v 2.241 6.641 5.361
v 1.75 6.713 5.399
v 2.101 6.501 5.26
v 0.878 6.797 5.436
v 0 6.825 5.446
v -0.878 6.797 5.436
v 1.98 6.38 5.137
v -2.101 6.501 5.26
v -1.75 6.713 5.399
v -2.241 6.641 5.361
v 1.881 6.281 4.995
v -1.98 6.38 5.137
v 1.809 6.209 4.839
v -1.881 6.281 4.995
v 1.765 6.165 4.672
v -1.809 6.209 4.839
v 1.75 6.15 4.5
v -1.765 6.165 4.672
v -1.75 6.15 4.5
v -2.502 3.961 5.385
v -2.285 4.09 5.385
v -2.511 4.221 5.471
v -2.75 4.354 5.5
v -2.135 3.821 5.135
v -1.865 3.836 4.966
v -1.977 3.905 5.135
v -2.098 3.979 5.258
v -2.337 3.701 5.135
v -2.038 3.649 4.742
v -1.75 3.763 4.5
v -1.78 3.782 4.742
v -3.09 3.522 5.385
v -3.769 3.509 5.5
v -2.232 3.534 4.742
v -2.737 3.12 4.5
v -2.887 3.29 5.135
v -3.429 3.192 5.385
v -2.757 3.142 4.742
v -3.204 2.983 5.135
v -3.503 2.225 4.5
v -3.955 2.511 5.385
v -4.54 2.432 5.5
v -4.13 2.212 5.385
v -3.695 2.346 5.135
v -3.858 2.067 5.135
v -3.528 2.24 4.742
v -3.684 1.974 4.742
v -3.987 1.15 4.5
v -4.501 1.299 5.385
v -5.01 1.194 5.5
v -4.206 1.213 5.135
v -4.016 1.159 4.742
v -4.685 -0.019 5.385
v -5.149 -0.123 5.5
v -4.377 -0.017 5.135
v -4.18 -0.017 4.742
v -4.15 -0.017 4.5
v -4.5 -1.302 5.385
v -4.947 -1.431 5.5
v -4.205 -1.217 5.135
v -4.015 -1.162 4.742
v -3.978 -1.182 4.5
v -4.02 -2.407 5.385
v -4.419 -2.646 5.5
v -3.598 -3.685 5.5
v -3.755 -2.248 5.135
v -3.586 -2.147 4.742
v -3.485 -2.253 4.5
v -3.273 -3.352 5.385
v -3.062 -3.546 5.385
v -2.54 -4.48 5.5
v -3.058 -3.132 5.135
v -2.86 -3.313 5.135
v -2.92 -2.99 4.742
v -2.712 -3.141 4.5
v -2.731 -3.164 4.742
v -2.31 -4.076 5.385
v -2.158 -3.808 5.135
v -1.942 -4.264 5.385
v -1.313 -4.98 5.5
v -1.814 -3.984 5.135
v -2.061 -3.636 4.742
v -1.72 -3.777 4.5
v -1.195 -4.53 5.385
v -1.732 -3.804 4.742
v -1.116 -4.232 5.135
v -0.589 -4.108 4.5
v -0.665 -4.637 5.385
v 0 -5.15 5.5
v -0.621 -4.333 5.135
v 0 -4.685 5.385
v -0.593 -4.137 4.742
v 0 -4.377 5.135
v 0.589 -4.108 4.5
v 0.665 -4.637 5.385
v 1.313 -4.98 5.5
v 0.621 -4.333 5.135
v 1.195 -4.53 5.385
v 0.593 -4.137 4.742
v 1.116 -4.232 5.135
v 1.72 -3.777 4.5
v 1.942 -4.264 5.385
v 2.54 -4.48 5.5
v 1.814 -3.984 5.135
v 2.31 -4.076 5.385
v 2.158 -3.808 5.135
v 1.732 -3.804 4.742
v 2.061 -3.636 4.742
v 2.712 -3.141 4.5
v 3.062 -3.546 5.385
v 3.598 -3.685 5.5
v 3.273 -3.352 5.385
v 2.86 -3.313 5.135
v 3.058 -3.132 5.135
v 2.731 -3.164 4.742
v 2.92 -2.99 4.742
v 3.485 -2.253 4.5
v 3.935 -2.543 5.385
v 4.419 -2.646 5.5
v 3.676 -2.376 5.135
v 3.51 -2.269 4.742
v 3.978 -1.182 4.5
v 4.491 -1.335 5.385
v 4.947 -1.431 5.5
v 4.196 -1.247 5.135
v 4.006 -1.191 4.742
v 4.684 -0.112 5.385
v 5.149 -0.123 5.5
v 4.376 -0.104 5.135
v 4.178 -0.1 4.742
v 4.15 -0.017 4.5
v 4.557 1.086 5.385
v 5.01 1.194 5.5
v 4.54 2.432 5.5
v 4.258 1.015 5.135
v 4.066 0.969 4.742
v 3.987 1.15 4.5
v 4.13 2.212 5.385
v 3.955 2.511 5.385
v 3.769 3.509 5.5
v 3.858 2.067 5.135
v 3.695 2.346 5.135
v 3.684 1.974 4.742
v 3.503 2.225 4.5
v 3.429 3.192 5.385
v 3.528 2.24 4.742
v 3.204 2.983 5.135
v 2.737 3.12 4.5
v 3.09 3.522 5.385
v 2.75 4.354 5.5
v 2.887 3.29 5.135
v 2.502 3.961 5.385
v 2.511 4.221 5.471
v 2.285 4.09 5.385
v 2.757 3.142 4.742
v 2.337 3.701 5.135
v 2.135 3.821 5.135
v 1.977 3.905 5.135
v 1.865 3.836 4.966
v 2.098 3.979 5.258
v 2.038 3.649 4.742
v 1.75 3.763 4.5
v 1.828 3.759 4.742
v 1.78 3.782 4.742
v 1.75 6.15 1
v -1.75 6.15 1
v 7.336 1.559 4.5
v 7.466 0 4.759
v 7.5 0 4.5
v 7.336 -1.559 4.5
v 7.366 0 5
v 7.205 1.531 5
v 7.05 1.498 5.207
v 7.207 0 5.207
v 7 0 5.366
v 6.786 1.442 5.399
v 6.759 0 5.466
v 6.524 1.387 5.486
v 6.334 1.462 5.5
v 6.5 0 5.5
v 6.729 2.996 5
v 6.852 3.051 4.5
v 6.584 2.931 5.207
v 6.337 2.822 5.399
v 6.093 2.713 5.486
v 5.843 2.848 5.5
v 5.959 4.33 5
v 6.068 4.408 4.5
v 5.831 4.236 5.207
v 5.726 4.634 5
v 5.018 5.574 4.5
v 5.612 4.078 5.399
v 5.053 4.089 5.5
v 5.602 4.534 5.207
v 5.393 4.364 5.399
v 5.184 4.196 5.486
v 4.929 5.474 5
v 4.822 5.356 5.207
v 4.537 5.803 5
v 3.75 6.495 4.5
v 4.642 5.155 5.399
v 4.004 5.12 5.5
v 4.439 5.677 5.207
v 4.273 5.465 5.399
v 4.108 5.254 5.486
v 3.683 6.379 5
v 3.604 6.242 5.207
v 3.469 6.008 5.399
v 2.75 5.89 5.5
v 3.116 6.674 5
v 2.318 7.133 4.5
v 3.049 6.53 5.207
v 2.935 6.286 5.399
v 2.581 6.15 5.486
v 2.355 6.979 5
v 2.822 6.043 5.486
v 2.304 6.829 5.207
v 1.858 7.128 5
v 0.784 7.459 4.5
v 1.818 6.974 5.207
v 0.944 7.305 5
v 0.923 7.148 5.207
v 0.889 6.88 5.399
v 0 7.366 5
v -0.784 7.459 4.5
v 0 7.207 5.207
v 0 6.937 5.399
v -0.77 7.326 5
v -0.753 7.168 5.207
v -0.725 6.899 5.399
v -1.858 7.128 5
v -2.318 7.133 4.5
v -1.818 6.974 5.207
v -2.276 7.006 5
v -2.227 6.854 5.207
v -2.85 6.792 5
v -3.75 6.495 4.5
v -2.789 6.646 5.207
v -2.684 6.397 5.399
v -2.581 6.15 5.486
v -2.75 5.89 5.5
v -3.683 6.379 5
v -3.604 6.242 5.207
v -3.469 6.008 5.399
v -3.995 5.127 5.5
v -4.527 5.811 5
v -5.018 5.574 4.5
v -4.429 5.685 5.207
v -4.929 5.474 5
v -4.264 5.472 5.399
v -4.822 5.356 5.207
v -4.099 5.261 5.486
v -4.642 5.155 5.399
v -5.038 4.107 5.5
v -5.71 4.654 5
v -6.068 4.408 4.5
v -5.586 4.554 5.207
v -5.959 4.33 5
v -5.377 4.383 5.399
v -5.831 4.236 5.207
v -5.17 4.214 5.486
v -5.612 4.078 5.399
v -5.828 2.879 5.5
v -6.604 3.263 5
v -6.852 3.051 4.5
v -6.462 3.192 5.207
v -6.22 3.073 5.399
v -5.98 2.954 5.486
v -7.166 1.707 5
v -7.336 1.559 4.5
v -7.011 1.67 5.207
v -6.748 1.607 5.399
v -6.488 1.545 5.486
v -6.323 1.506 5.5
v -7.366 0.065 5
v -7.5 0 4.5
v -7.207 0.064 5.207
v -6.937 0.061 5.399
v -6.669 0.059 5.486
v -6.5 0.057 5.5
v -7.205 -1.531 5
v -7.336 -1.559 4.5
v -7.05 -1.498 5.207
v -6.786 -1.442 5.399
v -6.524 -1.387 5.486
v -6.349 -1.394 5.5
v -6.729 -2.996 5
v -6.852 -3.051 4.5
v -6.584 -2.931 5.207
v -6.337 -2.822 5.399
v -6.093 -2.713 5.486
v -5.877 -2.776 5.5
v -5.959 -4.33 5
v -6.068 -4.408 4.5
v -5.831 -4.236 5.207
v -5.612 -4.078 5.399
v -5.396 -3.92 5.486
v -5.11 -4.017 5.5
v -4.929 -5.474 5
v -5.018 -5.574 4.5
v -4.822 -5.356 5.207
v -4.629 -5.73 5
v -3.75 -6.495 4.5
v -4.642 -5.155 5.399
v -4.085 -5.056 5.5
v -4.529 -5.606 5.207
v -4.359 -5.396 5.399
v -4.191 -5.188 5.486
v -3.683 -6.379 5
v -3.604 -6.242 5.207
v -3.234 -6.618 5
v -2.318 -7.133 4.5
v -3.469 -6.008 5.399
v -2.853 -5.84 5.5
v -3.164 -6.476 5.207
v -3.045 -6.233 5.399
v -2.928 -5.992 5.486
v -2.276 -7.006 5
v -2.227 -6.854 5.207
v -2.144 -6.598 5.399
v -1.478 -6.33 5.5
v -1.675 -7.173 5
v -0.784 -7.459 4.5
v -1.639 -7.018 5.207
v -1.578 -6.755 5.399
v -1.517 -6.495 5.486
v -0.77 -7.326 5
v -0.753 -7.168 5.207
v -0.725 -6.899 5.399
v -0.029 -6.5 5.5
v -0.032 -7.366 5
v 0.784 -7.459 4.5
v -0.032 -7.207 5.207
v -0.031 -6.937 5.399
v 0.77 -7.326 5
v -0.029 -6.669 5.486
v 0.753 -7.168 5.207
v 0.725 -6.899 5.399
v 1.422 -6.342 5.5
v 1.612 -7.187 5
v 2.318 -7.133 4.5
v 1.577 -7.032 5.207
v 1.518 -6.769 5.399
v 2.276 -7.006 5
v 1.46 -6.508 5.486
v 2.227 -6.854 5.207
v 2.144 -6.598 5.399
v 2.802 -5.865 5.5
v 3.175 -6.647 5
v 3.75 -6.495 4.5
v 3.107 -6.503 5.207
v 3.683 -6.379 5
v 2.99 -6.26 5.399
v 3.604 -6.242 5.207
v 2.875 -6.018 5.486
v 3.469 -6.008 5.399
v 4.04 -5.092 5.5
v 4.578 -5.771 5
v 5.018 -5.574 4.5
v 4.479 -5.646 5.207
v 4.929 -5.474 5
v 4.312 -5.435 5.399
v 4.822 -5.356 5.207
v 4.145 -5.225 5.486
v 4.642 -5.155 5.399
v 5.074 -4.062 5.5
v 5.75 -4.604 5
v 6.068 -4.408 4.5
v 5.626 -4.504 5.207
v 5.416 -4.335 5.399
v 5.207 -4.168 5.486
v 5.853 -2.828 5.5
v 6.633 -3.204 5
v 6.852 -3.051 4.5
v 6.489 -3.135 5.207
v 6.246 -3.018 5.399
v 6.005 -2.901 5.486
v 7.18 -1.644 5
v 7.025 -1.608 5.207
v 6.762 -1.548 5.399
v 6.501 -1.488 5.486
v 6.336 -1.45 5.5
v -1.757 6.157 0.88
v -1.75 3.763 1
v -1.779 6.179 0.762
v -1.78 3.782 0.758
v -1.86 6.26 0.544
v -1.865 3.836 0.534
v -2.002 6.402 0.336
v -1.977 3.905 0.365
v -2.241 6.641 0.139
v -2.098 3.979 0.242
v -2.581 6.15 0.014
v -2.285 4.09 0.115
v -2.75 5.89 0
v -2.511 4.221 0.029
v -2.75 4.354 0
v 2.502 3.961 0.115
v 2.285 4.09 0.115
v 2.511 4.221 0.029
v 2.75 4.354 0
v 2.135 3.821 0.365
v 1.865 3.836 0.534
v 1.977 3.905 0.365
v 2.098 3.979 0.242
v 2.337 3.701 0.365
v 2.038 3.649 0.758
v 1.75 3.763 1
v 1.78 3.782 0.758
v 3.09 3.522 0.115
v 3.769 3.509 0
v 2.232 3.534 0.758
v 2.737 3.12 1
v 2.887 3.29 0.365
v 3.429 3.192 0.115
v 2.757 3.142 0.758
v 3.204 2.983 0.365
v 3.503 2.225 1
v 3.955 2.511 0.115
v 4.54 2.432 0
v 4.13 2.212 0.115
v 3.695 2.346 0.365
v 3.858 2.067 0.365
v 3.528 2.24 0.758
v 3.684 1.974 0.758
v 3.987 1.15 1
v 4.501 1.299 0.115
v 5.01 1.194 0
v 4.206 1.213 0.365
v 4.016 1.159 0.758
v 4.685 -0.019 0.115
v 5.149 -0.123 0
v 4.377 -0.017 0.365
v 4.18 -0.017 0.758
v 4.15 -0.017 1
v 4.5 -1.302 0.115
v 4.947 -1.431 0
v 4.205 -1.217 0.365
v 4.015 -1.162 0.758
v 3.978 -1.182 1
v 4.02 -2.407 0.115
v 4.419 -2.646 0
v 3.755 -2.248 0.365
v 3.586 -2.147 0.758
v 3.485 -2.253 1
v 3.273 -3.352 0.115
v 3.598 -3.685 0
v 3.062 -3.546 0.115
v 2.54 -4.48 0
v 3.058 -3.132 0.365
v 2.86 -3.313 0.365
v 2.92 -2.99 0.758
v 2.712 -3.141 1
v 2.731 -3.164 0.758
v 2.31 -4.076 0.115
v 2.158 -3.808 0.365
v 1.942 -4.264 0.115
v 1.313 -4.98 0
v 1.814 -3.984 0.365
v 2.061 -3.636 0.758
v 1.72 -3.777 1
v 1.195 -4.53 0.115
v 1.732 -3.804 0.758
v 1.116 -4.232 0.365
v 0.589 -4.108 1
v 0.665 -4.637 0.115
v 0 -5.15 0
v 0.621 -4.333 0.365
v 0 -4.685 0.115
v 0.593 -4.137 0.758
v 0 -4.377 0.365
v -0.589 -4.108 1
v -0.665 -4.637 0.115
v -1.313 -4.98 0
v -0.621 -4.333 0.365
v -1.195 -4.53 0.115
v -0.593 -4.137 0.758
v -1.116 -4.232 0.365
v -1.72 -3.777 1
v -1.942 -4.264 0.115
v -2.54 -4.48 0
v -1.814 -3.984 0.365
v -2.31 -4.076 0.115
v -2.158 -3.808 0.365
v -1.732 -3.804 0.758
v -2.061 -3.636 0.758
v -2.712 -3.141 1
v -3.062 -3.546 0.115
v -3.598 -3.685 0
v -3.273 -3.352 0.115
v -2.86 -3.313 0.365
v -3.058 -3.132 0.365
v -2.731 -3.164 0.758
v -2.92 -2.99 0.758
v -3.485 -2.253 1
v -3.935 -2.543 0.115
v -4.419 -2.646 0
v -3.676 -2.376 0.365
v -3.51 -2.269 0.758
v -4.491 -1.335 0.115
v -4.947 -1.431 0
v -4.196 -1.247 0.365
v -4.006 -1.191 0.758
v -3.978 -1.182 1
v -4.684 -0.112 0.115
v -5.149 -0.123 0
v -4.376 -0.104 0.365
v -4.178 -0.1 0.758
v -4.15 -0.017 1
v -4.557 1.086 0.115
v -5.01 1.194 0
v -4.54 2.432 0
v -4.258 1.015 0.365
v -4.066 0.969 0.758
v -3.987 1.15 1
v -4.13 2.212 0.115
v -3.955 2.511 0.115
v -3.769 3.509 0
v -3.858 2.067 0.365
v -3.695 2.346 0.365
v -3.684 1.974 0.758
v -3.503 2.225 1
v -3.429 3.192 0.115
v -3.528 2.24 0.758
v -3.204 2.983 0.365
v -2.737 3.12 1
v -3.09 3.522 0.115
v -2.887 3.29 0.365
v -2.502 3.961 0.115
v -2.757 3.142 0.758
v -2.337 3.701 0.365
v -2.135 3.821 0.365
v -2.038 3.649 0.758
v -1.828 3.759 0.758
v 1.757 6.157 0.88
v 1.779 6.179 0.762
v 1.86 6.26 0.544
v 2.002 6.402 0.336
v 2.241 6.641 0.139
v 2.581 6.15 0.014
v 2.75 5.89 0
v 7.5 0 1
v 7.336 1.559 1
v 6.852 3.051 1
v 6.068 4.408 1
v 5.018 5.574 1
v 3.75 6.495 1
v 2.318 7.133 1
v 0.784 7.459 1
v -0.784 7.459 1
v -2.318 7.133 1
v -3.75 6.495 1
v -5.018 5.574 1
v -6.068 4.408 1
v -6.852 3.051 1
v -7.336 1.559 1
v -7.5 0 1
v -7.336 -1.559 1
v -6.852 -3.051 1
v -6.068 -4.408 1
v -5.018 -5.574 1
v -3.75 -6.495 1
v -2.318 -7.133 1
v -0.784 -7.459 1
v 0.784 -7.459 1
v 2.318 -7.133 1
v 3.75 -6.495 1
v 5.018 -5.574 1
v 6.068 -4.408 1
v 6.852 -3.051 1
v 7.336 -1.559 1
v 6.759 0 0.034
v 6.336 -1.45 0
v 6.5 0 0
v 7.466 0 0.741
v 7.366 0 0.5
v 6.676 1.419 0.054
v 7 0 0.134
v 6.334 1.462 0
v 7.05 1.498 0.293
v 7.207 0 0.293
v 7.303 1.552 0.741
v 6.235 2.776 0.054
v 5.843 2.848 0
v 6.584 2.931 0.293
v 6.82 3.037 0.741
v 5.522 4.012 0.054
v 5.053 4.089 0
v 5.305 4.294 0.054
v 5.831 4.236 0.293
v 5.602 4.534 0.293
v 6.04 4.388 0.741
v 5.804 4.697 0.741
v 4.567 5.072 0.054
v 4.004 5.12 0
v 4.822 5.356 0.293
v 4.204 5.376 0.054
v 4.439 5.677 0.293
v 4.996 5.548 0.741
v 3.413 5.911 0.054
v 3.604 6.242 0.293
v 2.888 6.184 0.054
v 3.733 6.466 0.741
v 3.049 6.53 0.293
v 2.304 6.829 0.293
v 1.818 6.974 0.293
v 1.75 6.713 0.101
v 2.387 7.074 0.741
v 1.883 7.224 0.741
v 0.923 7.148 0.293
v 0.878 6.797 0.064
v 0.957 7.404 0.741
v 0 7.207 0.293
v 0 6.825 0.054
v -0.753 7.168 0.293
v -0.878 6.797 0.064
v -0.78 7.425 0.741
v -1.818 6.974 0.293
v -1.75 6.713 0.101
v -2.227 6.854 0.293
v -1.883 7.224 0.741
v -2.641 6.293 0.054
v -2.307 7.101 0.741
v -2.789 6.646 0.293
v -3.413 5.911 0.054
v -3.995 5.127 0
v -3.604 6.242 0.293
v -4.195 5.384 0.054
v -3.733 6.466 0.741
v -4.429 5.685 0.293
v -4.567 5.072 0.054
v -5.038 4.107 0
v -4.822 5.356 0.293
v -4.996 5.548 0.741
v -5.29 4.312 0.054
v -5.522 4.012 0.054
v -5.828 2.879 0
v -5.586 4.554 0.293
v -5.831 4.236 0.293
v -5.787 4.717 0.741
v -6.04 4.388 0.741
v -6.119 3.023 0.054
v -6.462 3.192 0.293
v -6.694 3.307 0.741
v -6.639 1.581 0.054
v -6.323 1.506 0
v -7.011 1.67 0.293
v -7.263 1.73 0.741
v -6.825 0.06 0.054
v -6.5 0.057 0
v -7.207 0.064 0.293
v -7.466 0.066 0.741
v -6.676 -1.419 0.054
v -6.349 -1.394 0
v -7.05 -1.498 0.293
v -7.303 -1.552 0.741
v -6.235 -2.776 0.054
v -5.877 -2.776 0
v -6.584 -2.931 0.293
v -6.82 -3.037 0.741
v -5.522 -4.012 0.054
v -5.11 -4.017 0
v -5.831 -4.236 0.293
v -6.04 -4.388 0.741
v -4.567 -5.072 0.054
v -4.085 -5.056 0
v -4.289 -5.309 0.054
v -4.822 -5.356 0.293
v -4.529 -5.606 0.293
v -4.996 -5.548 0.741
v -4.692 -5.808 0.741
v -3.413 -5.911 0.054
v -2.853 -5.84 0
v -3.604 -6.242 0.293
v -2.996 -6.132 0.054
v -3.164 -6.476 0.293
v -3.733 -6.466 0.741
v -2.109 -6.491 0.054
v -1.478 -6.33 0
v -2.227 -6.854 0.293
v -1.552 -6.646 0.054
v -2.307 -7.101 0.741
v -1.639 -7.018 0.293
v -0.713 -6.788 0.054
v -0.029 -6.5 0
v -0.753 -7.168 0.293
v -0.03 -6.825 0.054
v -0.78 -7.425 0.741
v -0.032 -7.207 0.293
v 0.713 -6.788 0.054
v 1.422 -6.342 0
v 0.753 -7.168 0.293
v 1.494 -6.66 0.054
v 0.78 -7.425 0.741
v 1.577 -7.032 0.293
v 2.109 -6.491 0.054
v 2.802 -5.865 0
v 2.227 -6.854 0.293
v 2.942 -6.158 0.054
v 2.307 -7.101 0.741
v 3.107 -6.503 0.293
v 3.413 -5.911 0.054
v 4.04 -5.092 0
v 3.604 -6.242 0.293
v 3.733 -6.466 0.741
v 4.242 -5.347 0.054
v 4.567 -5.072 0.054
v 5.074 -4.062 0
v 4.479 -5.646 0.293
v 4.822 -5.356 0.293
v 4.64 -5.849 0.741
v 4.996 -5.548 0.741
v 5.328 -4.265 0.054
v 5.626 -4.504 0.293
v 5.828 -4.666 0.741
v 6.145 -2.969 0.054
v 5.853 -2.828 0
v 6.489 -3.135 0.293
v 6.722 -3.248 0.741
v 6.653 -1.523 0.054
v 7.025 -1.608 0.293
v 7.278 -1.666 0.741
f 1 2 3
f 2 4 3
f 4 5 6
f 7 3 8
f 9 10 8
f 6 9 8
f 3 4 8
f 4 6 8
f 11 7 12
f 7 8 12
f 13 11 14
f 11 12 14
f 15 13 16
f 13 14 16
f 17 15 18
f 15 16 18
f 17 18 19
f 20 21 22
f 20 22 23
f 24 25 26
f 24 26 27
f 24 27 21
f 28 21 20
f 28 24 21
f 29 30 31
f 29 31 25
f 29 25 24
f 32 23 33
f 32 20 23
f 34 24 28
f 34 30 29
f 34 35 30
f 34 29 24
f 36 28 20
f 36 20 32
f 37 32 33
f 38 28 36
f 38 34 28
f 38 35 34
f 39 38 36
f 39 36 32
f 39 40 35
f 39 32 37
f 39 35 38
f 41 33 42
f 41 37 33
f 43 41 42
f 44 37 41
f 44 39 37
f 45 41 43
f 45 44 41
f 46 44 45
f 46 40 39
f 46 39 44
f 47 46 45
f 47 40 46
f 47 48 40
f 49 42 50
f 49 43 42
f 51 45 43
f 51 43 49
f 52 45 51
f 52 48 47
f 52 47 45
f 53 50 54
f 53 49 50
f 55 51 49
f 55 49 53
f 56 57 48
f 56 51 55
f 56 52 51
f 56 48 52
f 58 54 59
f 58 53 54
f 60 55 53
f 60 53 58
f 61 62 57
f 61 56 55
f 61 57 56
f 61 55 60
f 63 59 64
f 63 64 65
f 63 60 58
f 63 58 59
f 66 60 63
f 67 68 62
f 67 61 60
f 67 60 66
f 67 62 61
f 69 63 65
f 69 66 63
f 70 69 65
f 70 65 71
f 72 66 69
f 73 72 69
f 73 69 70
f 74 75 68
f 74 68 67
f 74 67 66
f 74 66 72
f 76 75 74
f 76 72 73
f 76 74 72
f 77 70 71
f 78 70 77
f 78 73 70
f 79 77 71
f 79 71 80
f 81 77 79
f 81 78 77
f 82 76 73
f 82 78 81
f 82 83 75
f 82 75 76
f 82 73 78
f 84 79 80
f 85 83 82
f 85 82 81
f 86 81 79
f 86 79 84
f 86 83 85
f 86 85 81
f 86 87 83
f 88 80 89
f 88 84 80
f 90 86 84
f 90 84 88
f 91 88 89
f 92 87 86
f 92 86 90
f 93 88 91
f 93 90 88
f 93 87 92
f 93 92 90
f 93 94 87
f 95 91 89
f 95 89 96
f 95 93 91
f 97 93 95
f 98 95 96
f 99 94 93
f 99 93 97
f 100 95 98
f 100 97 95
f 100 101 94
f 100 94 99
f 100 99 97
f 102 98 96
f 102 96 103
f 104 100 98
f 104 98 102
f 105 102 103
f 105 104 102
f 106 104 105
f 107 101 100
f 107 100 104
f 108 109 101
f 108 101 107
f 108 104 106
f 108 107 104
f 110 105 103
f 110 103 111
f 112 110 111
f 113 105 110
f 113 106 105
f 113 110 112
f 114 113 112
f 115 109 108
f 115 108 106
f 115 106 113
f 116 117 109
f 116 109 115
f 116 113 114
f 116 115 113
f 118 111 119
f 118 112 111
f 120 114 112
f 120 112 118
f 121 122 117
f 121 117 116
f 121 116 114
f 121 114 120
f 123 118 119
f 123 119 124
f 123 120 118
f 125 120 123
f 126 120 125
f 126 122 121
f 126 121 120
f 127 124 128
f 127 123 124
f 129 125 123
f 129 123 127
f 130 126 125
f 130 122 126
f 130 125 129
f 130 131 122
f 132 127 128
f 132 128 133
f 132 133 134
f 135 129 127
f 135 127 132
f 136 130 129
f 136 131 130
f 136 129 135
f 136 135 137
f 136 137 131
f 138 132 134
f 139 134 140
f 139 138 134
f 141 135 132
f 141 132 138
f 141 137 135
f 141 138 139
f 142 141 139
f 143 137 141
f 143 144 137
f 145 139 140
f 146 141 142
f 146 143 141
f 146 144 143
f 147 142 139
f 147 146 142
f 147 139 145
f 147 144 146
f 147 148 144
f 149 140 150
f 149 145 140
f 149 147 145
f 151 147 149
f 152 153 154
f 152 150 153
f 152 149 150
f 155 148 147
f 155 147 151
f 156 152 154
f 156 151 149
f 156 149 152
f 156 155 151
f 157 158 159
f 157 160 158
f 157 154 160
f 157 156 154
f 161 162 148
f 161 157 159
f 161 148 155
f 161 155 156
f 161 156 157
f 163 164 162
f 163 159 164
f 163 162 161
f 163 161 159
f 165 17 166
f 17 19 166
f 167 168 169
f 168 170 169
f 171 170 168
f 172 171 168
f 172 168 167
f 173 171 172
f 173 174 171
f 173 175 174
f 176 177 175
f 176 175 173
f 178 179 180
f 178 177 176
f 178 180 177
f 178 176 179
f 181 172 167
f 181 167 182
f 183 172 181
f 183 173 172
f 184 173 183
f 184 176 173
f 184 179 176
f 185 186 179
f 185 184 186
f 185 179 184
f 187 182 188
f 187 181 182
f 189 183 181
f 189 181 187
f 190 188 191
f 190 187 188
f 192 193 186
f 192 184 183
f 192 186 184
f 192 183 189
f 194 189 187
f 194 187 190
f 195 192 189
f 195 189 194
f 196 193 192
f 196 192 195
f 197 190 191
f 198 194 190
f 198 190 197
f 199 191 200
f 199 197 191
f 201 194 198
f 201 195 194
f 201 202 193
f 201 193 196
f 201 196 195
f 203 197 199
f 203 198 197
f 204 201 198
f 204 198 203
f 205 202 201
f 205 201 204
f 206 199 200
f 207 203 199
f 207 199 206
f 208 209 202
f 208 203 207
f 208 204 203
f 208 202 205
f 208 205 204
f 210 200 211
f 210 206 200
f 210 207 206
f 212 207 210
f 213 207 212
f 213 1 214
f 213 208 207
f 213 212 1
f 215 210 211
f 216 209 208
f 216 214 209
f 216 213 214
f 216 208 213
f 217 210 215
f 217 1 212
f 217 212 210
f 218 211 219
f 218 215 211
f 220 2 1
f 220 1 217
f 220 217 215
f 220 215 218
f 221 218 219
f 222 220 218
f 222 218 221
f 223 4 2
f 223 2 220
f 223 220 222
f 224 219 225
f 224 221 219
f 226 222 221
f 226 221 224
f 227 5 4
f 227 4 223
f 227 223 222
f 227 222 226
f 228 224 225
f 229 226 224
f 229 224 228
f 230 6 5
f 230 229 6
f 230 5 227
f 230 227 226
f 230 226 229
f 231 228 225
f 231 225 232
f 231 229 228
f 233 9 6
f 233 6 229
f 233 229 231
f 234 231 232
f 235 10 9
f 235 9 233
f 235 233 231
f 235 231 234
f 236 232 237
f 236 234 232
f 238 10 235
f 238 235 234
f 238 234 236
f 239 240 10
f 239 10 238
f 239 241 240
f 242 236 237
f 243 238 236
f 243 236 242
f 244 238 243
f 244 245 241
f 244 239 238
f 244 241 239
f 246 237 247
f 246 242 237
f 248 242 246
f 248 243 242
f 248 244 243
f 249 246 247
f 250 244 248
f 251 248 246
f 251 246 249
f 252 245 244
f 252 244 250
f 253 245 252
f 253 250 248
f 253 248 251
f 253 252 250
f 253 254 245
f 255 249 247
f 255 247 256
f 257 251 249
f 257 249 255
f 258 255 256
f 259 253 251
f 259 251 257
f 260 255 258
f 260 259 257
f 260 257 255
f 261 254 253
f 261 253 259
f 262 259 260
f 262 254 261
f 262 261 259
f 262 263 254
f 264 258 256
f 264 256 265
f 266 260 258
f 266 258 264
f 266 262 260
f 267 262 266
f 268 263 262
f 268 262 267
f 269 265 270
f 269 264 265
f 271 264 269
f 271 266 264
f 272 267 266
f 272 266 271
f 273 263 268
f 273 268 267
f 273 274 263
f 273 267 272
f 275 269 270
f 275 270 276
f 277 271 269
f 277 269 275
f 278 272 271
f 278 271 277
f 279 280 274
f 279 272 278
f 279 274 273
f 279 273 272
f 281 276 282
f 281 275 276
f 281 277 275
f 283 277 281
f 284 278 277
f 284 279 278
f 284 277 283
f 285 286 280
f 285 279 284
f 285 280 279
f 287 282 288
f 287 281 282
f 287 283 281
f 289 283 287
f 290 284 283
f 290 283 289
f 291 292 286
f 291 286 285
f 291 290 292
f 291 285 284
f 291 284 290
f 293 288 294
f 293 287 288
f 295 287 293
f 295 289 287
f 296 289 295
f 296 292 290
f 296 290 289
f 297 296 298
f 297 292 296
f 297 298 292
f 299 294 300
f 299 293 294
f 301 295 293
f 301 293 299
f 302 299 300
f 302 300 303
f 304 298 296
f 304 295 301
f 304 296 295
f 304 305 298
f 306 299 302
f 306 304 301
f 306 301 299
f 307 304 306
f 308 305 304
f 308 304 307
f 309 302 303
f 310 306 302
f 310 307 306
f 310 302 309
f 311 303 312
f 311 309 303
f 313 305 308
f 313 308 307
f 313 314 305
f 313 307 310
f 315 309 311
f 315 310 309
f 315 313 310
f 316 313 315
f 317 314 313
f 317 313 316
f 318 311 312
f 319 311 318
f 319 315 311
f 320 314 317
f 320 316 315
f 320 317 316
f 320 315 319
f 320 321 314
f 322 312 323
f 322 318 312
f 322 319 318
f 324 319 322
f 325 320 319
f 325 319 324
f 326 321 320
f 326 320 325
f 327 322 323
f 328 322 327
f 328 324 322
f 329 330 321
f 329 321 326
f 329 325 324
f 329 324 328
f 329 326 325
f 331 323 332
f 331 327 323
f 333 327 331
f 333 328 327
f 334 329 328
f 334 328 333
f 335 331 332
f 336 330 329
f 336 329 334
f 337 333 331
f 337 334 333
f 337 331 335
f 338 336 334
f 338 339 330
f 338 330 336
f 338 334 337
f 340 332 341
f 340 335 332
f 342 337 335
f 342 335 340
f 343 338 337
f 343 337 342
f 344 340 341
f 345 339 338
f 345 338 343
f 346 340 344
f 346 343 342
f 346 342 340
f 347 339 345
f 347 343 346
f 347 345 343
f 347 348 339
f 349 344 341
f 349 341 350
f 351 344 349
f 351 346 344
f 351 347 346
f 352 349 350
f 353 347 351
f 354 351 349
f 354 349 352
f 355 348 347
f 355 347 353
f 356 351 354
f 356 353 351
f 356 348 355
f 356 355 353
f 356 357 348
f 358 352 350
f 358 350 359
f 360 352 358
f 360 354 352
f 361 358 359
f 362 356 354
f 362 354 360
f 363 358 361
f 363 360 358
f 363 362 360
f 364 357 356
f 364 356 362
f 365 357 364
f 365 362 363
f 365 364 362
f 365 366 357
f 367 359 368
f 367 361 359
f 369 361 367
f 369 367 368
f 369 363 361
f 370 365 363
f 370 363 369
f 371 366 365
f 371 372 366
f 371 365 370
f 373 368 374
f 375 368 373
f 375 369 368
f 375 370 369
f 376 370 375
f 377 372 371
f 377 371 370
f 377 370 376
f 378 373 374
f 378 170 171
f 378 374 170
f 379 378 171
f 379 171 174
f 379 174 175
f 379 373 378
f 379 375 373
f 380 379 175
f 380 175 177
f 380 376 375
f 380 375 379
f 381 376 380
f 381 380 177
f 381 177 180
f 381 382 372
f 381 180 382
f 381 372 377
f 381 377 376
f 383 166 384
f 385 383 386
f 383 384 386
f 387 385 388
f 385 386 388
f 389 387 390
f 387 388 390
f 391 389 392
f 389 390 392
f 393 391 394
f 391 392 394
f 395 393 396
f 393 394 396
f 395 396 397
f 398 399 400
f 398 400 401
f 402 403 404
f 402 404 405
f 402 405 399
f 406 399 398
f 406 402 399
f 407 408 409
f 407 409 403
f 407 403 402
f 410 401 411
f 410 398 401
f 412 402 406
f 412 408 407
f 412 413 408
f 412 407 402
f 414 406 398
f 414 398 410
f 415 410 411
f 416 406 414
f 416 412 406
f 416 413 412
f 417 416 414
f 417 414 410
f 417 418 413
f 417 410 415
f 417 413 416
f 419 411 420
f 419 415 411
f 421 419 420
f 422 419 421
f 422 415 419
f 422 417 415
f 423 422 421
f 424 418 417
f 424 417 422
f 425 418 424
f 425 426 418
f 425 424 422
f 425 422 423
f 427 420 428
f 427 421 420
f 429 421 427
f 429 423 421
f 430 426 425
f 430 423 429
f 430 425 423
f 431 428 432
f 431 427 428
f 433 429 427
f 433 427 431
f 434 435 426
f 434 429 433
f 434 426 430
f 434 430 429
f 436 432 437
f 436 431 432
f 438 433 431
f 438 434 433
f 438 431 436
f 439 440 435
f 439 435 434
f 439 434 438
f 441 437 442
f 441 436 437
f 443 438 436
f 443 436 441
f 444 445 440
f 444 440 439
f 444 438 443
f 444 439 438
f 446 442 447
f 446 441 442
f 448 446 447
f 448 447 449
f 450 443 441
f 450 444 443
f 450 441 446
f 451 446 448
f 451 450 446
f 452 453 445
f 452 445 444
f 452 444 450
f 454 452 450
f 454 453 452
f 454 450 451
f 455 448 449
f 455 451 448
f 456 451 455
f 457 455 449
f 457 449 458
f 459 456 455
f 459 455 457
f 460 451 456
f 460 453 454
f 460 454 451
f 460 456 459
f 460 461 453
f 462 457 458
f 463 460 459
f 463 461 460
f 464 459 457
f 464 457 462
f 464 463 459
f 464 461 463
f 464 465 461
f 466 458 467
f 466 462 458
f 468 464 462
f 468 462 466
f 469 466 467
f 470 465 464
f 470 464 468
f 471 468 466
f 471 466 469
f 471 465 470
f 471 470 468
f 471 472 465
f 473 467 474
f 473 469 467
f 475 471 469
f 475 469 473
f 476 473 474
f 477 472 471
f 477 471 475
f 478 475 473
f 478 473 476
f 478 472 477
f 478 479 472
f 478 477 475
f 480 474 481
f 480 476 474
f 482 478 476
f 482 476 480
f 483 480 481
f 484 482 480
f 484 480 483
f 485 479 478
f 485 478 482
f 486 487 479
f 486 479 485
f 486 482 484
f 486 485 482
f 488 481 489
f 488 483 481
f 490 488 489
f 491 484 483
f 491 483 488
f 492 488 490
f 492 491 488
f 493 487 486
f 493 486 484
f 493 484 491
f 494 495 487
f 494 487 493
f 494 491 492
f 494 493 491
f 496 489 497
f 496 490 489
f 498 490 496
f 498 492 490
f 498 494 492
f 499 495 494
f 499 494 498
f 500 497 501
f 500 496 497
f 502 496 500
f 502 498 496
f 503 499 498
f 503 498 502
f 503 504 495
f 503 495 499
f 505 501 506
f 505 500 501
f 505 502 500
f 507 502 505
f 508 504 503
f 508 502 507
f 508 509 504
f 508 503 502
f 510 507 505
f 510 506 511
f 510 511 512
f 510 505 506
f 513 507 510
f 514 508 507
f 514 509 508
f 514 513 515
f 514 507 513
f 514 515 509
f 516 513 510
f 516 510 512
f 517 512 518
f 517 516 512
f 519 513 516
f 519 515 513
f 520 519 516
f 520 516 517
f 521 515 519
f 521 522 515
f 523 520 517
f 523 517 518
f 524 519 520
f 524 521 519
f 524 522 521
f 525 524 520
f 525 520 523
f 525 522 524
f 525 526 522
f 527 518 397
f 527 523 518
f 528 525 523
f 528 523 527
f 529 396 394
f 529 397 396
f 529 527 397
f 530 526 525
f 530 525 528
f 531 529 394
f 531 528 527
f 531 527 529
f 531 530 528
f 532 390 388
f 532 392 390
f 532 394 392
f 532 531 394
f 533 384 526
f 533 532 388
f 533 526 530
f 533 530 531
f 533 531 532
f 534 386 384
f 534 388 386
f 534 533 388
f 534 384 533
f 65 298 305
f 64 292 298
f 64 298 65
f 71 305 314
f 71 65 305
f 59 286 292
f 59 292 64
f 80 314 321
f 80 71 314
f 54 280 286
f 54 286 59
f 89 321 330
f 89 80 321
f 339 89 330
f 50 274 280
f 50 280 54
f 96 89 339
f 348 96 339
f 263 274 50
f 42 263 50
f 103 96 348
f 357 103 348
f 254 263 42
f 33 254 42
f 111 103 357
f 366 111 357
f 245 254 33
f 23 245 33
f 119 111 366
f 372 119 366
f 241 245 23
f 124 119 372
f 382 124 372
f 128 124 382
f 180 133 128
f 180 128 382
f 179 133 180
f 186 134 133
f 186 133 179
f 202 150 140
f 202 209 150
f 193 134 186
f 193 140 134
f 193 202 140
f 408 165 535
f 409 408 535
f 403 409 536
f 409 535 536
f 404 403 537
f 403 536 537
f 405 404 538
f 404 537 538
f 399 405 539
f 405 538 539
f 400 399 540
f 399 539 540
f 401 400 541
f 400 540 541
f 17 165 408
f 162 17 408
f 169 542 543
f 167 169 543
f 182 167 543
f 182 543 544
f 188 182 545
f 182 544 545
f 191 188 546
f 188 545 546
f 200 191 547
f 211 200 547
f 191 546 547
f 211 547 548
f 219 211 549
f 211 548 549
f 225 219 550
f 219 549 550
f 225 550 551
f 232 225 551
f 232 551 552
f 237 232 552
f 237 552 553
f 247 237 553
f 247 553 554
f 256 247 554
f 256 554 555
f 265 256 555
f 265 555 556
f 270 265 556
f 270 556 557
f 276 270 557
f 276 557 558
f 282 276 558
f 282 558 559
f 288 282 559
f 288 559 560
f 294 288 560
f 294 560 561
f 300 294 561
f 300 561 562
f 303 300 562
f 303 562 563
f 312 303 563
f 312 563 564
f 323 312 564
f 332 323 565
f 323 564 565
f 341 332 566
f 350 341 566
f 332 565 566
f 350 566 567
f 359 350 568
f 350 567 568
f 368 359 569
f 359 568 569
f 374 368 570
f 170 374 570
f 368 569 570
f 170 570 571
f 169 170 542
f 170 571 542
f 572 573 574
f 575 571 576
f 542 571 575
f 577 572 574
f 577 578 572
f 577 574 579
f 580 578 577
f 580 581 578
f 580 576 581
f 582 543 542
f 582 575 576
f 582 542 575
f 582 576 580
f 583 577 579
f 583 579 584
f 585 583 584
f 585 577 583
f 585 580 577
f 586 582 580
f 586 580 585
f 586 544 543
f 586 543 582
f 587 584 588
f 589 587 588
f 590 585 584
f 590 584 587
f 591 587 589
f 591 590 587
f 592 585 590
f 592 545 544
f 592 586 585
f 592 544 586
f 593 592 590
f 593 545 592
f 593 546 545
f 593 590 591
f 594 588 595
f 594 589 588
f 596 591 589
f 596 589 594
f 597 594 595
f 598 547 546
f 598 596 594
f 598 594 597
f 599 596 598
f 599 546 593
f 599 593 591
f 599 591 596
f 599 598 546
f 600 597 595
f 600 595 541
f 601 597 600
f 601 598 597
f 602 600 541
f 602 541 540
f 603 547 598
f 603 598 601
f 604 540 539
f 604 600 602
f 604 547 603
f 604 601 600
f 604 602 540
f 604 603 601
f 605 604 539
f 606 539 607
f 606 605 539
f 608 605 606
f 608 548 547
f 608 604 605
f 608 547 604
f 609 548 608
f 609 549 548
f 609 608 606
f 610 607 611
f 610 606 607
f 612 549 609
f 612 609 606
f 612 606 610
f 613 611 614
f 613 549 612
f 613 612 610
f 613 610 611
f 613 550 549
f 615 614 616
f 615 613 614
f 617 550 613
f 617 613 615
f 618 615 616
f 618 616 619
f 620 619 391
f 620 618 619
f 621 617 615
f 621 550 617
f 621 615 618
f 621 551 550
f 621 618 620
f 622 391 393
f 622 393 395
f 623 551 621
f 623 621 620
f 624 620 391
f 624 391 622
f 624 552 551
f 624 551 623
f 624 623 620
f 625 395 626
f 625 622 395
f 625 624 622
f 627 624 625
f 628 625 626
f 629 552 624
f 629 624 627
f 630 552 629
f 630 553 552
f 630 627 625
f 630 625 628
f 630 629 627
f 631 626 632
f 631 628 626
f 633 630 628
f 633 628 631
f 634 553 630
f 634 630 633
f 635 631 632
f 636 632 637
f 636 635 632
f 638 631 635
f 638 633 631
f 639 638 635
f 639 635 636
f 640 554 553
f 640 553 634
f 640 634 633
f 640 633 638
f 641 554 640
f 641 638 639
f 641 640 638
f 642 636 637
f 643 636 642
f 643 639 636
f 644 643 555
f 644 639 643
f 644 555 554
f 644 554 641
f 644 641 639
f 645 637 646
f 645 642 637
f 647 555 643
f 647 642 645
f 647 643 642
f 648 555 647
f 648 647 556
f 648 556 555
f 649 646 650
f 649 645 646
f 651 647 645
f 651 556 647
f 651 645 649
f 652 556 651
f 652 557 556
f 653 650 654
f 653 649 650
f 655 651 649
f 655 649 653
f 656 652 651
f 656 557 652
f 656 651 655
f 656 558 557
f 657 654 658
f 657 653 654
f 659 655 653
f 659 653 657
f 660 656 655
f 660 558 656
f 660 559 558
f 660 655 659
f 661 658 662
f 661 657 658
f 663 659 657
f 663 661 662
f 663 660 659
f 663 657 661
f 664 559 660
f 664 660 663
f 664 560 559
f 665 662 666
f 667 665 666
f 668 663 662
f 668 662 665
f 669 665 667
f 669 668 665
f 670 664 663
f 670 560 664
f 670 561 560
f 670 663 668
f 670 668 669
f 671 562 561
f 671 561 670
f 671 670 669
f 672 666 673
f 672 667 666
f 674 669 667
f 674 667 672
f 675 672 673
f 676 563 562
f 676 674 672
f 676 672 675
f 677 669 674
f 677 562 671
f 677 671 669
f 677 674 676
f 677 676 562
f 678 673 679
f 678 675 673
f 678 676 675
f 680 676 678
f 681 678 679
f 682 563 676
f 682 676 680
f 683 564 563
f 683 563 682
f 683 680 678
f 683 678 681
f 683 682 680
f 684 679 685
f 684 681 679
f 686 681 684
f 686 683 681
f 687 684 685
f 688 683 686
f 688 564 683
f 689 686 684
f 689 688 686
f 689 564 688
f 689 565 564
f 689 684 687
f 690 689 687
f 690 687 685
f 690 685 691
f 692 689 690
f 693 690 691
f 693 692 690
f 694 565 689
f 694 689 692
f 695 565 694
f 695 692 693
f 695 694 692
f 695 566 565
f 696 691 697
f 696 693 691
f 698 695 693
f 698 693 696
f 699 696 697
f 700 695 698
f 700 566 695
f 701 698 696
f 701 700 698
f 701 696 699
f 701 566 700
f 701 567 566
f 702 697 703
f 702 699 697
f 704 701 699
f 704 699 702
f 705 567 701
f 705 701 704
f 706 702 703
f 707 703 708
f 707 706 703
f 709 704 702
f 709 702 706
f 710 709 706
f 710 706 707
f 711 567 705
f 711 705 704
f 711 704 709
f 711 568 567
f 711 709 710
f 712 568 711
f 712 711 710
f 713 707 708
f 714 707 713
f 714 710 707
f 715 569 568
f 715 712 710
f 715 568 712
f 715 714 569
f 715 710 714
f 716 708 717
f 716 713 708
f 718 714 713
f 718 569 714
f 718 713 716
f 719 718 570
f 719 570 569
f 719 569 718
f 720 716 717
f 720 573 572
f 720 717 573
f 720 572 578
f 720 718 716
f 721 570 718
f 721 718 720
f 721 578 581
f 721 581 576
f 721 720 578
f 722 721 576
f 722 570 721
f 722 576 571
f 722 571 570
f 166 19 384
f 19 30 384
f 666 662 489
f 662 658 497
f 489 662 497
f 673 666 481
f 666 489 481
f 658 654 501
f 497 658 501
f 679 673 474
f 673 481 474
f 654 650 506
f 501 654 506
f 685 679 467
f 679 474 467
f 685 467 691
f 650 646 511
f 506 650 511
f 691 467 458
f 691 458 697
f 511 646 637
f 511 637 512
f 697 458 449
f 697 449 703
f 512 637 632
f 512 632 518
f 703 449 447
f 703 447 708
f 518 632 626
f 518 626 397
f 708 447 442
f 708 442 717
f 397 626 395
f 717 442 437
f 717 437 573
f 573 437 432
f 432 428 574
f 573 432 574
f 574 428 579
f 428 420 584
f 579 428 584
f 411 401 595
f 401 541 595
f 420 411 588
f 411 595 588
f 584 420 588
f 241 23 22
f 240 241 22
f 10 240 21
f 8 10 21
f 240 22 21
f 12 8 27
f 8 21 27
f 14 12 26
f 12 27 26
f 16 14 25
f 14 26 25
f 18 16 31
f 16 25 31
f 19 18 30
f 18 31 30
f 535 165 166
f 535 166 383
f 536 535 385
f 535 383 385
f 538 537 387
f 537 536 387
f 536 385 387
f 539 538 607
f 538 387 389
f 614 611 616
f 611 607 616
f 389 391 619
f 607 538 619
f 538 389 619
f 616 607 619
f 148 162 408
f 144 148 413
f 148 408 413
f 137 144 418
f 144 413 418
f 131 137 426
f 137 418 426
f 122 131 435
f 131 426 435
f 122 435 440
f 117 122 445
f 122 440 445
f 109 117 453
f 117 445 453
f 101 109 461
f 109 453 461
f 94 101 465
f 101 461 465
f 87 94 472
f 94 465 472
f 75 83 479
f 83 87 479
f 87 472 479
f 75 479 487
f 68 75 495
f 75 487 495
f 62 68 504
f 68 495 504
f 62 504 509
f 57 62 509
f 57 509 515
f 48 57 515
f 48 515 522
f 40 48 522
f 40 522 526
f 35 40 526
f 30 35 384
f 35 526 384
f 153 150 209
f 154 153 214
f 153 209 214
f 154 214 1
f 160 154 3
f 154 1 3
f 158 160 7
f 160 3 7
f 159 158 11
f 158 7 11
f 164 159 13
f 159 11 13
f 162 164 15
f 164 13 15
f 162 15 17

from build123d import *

# Parameters (mm, degrees)
SKIZZE1_R                       = 7.5
AUFSATZ_LINEAR_AUSTRAGEN1_DEPTH = 5.5
VERRUNDUNG1_R                   = 1


with BuildPart() as part:
    # Skizze1 → Aufsatz-Linear austragen1 (new body)
    with BuildSketch(Plane.XY):
        Circle(SKIZZE1_R)
        with BuildLine():
            ThreePointArc((4.15, -1.02e-15), (-2.2315913604421826, -3.498928407384154), (-1.749999999999914, 3.762977544445396))
            Line((-1.75, 3.762977544445424), (-1.75, 6.15))
            Line((-1.75, 6.150000000000001), (1.75, 6.150000000000001))
            Line((1.75, 6.15), (1.75, 3.7629775444453486))
            ThreePointArc((1.7500000000000098, 3.7629775444453517), (3.498928407384184, 2.2315913604421356), (4.15, 0))
        make_face(mode=Mode.SUBTRACT)
    extrude(amount=AUFSATZ_LINEAR_AUSTRAGEN1_DEPTH)

    # Verrundung1
    # the kernel refuses this fillet: 1 mm, written as the material it takes off along each edge
    with BuildSketch(Plane(origin=(-1.75, 1.2629775444454236, 5.5), x_dir=(-1, 0, 0), z_dir=(0, 1, 0))) as verrundung1_piece_1:
        with BuildLine():
            CenterArc((VERRUNDUNG1_R, -VERRUNDUNG1_R), VERRUNDUNG1_R, 90, 90)
            Line((0, -VERRUNDUNG1_R), (0, 0))
            Line((0, 0), (VERRUNDUNG1_R, 0))
        make_face()
    extrude(amount=4.887022455554577, mode=Mode.SUBTRACT)
    with BuildSketch(Plane(origin=(-1.75, 6.150000000000001, 5.5), x_dir=(0, 1, 0), z_dir=(1, 0, 0))) as verrundung1_piece_2:
        with BuildLine():
            CenterArc((VERRUNDUNG1_R, -VERRUNDUNG1_R), VERRUNDUNG1_R, 90, 90)
            Line((0, -VERRUNDUNG1_R), (0, 0))
            Line((0, 0), (VERRUNDUNG1_R, 0))
        make_face()
    extrude(amount=3.5, mode=Mode.SUBTRACT)
    with BuildSketch(Plane(origin=(1.75, 6.15, 5.5), x_dir=(1, 0, 0), z_dir=(0, -1, 0))) as verrundung1_piece_3:
        with BuildLine():
            CenterArc((VERRUNDUNG1_R, -VERRUNDUNG1_R), VERRUNDUNG1_R, 90, 90)
            Line((0, -VERRUNDUNG1_R), (0, 0))
            Line((0, 0), (VERRUNDUNG1_R, 0))
        make_face()
    extrude(amount=4.887022455554652, mode=Mode.SUBTRACT)
    with BuildSketch(Plane(origin=(0, 0, 5.5), x_dir=(1, 0, 0), z_dir=(0, -1, 0))) as verrundung1_piece_4:
        with BuildLine():
            CenterArc((7.5 - VERRUNDUNG1_R, -VERRUNDUNG1_R), VERRUNDUNG1_R, 0, 90)
            Line((7.5 - VERRUNDUNG1_R, 0), (7.5, 0))
            Line((7.5, 0), (7.5, -VERRUNDUNG1_R))
        make_face()
    revolve(axis=Axis((0, 0, 5.5), (0, 0, 1)), mode=Mode.SUBTRACT)
    with BuildSketch(Plane(origin=(-6e-17, 3.3e-16, 5.5), x_dir=(-0.0031415874858718097, 0.9999950652018581, 0), z_dir=(0.9999950652018581, 0.0031415874858718097, 0))) as verrundung1_piece_5:
        with BuildLine():
            CenterArc((4.1499999999999995 + VERRUNDUNG1_R, -VERRUNDUNG1_R), VERRUNDUNG1_R, 90, 90)
            Line((4.1499999999999995, -VERRUNDUNG1_R), (4.1499999999999995, 0))
            Line((4.1499999999999995, 0), (4.1499999999999995 + VERRUNDUNG1_R, 0))
        make_face()
    revolve(axis=Axis((-6e-17, 3.3e-16, 5.5), (0, 0, 1)), revolution_arc=359.64, mode=Mode.SUBTRACT)
    with BuildSketch(Plane(origin=(0, 0, 0), x_dir=(1, 0, 0), z_dir=(0, -1, 0))) as verrundung1_piece_6:
        with BuildLine():
            CenterArc((7.5 - VERRUNDUNG1_R, VERRUNDUNG1_R), VERRUNDUNG1_R, 270, 90)
            Line((7.5 - VERRUNDUNG1_R, -1.1e-16), (7.5, 0))
            Line((7.5, 0), (7.5, VERRUNDUNG1_R))
        make_face()
    revolve(axis=Axis((0, 0, 0), (0, 0, 1)), mode=Mode.SUBTRACT)
    with BuildSketch(Plane(origin=(1.75, 6.15, 0), x_dir=(0, 0, 1), z_dir=(0, -1, 0))) as verrundung1_piece_7:
        with BuildLine():
            CenterArc((VERRUNDUNG1_R, -VERRUNDUNG1_R), VERRUNDUNG1_R, 90, 90)
            Line((-1.1e-16, -VERRUNDUNG1_R), (0, 0))
            Line((0, 0), (VERRUNDUNG1_R, 0))
        make_face()
    extrude(amount=4.887022455554652, mode=Mode.SUBTRACT)
    with BuildSketch(Plane(origin=(-1.75, 6.150000000000001, 0), x_dir=(0, 0, 1), z_dir=(1, 0, 0))) as verrundung1_piece_8:
        with BuildLine():
            CenterArc((VERRUNDUNG1_R, -VERRUNDUNG1_R), VERRUNDUNG1_R, 90, 90)
            Line((-1.1e-16, -VERRUNDUNG1_R), (0, 0))
            Line((0, 0), (VERRUNDUNG1_R, 0))
        make_face()
    extrude(amount=3.5, mode=Mode.SUBTRACT)
    with BuildSketch(Plane(origin=(-1.75, 1.2629775444454236, 0), x_dir=(0, 0, 1), z_dir=(0, 1, 0))) as verrundung1_piece_9:
        with BuildLine():
            CenterArc((VERRUNDUNG1_R, -VERRUNDUNG1_R), VERRUNDUNG1_R, 90, 90)
            Line((-1.1e-16, -VERRUNDUNG1_R), (0, 0))
            Line((0, 0), (VERRUNDUNG1_R, 0))
        make_face()
    extrude(amount=4.887022455554577, mode=Mode.SUBTRACT)
    with BuildSketch(Plane(origin=(1.55e-15, 1e-15, 0), x_dir=(0.0031415874858877553, 0.9999950652018581, 0), z_dir=(-0.9999950652018581, 0.0031415874858877553, 0))) as verrundung1_piece_10:
        with BuildLine():
            CenterArc((4.149999999999999 + VERRUNDUNG1_R, -VERRUNDUNG1_R), VERRUNDUNG1_R, 90, 90)
            Line((4.149999999999999 + VERRUNDUNG1_R, 1.1e-16), (4.149999999999999, 0))
            Line((4.149999999999999, 0), (4.149999999999999, -VERRUNDUNG1_R))
        make_face()
    revolve(axis=Axis((1.55e-15, 1e-15, 0), (0, 0, -1)), revolution_arc=359.64, mode=Mode.SUBTRACT)
    with BuildSketch(Plane(origin=(-1.75, 1.2629775444454236, 5.5), x_dir=(-1, 0, 0), z_dir=(0, 1, 0))) as verrundung1_piece_11a_section:
        with BuildLine():
            CenterArc((VERRUNDUNG1_R, -VERRUNDUNG1_R), VERRUNDUNG1_R, 90, 90)
            Line((0, -VERRUNDUNG1_R), (0, 0))
            Line((0, 0), (VERRUNDUNG1_R, 0))
        make_face()
    verrundung1_piece_11a = extrude(amount=7.387022455554577, mode=Mode.PRIVATE)
    verrundung1_piece_11a = verrundung1_piece_11a & Plane(origin=(0, 0, 5.5), x_dir=(1, 0, 0), z_dir=(0, 0, -1)) * Cylinder(7.5, 19, mode=Mode.PRIVATE)
    verrundung1_piece_11a = split(verrundung1_piece_11a, bisect_by=Plane(origin=(-1.75, 6.15, 5.5), z_dir=(0, 1, 0)), keep=Keep.TOP, mode=Mode.PRIVATE)
    with BuildSketch(Plane(origin=(-4.25, 6.150000000000001, 5.5), x_dir=(0, 1, 0), z_dir=(1, 0, 0))) as verrundung1_piece_11b_section:
        with BuildLine():
            CenterArc((VERRUNDUNG1_R, -VERRUNDUNG1_R), VERRUNDUNG1_R, 90, 90)
            Line((0, -VERRUNDUNG1_R), (0, 0))
            Line((0, 0), (VERRUNDUNG1_R, 0))
        make_face()
    verrundung1_piece_11b = extrude(amount=6, mode=Mode.PRIVATE)
    verrundung1_piece_11b = verrundung1_piece_11b & Plane(origin=(0, 0, 5.5), x_dir=(1, 0, 0), z_dir=(0, 0, -1)) * Cylinder(7.5, 16, mode=Mode.PRIVATE)
    verrundung1_piece_11b = split(verrundung1_piece_11b, bisect_by=Plane(origin=(-1.75, 6.150000000000001, 5.5), z_dir=(-1, 0, 0)), keep=Keep.TOP, mode=Mode.PRIVATE)
    verrundung1_piece_11 = verrundung1_piece_11a & verrundung1_piece_11b
    add(verrundung1_piece_11, mode=Mode.SUBTRACT)
    with BuildSketch(Plane(origin=(-1.75, 6.150000000000001, 5.5), x_dir=(0, 1, 0), z_dir=(1, 0, 0))) as verrundung1_piece_12a_section:
        with BuildLine():
            CenterArc((VERRUNDUNG1_R, -VERRUNDUNG1_R), VERRUNDUNG1_R, 90, 90)
            Line((0, -VERRUNDUNG1_R), (0, 0))
            Line((0, 0), (VERRUNDUNG1_R, 0))
        make_face()
    verrundung1_piece_12a = extrude(amount=6, mode=Mode.PRIVATE)
    verrundung1_piece_12a = verrundung1_piece_12a & Plane(origin=(0, 0, 5.5), x_dir=(1, 0, 0), z_dir=(0, 0, -1)) * Cylinder(7.5, 16, mode=Mode.PRIVATE)
    verrundung1_piece_12a = split(verrundung1_piece_12a, bisect_by=Plane(origin=(1.75, 6.150000000000001, 5.5), z_dir=(1, 0, 0)), keep=Keep.TOP, mode=Mode.PRIVATE)
    with BuildSketch(Plane(origin=(1.75, 8.65, 5.5), x_dir=(1, 0, 0), z_dir=(0, -1, 0))) as verrundung1_piece_12b_section:
        with BuildLine():
            CenterArc((VERRUNDUNG1_R, -VERRUNDUNG1_R), VERRUNDUNG1_R, 90, 90)
            Line((0, -VERRUNDUNG1_R), (0, 0))
            Line((0, 0), (VERRUNDUNG1_R, 0))
        make_face()
    verrundung1_piece_12b = extrude(amount=7.387022455554652, mode=Mode.PRIVATE)
    verrundung1_piece_12b = verrundung1_piece_12b & Plane(origin=(0, 0, 5.5), x_dir=(1, 0, 0), z_dir=(0, 0, -1)) * Cylinder(7.5, 19, mode=Mode.PRIVATE)
    verrundung1_piece_12b = split(verrundung1_piece_12b, bisect_by=Plane(origin=(1.75, 6.150000000000001, 5.5), z_dir=(0, 1, 0)), keep=Keep.TOP, mode=Mode.PRIVATE)
    verrundung1_piece_12 = verrundung1_piece_12a & verrundung1_piece_12b
    add(verrundung1_piece_12, mode=Mode.SUBTRACT)
    with BuildSketch(Plane(origin=(1.75, 8.65, 0), x_dir=(0, 0, 1), z_dir=(0, -1, 0))) as verrundung1_piece_13a_section:
        with BuildLine():
            CenterArc((VERRUNDUNG1_R, -VERRUNDUNG1_R), VERRUNDUNG1_R, 90, 90)
            Line((-1.1e-16, -VERRUNDUNG1_R), (0, 0))
            Line((0, 0), (VERRUNDUNG1_R, 0))
        make_face()
    verrundung1_piece_13a = extrude(amount=7.387022455554652, mode=Mode.PRIVATE)
    verrundung1_piece_13a = verrundung1_piece_13a & Plane(origin=(0, 0, 0), x_dir=(1, 0, 0), z_dir=(0, 0, -1)) * Cylinder(7.5, 19, mode=Mode.PRIVATE)
    verrundung1_piece_13a = split(verrundung1_piece_13a, bisect_by=Plane(origin=(1.75, 6.150000000000001, 0), z_dir=(0, 1, 0)), keep=Keep.TOP, mode=Mode.PRIVATE)
    with BuildSketch(Plane(origin=(-1.75, 6.150000000000001, 0), x_dir=(0, 0, 1), z_dir=(1, 0, 0))) as verrundung1_piece_13b_section:
        with BuildLine():
            CenterArc((VERRUNDUNG1_R, -VERRUNDUNG1_R), VERRUNDUNG1_R, 90, 90)
            Line((-1.1e-16, -VERRUNDUNG1_R), (0, 0))
            Line((0, 0), (VERRUNDUNG1_R, 0))
        make_face()
    verrundung1_piece_13b = extrude(amount=6, mode=Mode.PRIVATE)
    verrundung1_piece_13b = verrundung1_piece_13b & Plane(origin=(0, 0, 0), x_dir=(1, 0, 0), z_dir=(0, 0, -1)) * Cylinder(7.5, 16, mode=Mode.PRIVATE)
    verrundung1_piece_13b = split(verrundung1_piece_13b, bisect_by=Plane(origin=(1.75, 6.150000000000001, 0), z_dir=(1, 0, 0)), keep=Keep.TOP, mode=Mode.PRIVATE)
    verrundung1_piece_13 = verrundung1_piece_13a & verrundung1_piece_13b
    add(verrundung1_piece_13, mode=Mode.SUBTRACT)
    with BuildSketch(Plane(origin=(-4.25, 6.150000000000001, 0), x_dir=(0, 0, 1), z_dir=(1, 0, 0))) as verrundung1_piece_14a_section:
        with BuildLine():
            CenterArc((VERRUNDUNG1_R, -VERRUNDUNG1_R), VERRUNDUNG1_R, 90, 90)
            Line((-1.1e-16, -VERRUNDUNG1_R), (0, 0))
            Line((0, 0), (VERRUNDUNG1_R, 0))
        make_face()
    verrundung1_piece_14a = extrude(amount=6, mode=Mode.PRIVATE)
    verrundung1_piece_14a = verrundung1_piece_14a & Plane(origin=(0, 0, 0), x_dir=(1, 0, 0), z_dir=(0, 0, -1)) * Cylinder(7.5, 16, mode=Mode.PRIVATE)
    verrundung1_piece_14a = split(verrundung1_piece_14a, bisect_by=Plane(origin=(-1.75, 6.150000000000001, 0), z_dir=(-1, 0, 0)), keep=Keep.TOP, mode=Mode.PRIVATE)
    with BuildSketch(Plane(origin=(-1.75, 1.2629775444454236, 0), x_dir=(0, 0, 1), z_dir=(0, 1, 0))) as verrundung1_piece_14b_section:
        with BuildLine():
            CenterArc((VERRUNDUNG1_R, -VERRUNDUNG1_R), VERRUNDUNG1_R, 90, 90)
            Line((-1.1e-16, -VERRUNDUNG1_R), (0, 0))
            Line((0, 0), (VERRUNDUNG1_R, 0))
        make_face()
    verrundung1_piece_14b = extrude(amount=7.387022455554577, mode=Mode.PRIVATE)
    verrundung1_piece_14b = verrundung1_piece_14b & Plane(origin=(0, 0, 0), x_dir=(1, 0, 0), z_dir=(0, 0, -1)) * Cylinder(7.5, 19, mode=Mode.PRIVATE)
    verrundung1_piece_14b = split(verrundung1_piece_14b, bisect_by=Plane(origin=(-1.75, 6.15, 0), z_dir=(0, 1, 0)), keep=Keep.TOP, mode=Mode.PRIVATE)
    verrundung1_piece_14 = verrundung1_piece_14a & verrundung1_piece_14b
    add(verrundung1_piece_14, mode=Mode.SUBTRACT)


solid = part.part
